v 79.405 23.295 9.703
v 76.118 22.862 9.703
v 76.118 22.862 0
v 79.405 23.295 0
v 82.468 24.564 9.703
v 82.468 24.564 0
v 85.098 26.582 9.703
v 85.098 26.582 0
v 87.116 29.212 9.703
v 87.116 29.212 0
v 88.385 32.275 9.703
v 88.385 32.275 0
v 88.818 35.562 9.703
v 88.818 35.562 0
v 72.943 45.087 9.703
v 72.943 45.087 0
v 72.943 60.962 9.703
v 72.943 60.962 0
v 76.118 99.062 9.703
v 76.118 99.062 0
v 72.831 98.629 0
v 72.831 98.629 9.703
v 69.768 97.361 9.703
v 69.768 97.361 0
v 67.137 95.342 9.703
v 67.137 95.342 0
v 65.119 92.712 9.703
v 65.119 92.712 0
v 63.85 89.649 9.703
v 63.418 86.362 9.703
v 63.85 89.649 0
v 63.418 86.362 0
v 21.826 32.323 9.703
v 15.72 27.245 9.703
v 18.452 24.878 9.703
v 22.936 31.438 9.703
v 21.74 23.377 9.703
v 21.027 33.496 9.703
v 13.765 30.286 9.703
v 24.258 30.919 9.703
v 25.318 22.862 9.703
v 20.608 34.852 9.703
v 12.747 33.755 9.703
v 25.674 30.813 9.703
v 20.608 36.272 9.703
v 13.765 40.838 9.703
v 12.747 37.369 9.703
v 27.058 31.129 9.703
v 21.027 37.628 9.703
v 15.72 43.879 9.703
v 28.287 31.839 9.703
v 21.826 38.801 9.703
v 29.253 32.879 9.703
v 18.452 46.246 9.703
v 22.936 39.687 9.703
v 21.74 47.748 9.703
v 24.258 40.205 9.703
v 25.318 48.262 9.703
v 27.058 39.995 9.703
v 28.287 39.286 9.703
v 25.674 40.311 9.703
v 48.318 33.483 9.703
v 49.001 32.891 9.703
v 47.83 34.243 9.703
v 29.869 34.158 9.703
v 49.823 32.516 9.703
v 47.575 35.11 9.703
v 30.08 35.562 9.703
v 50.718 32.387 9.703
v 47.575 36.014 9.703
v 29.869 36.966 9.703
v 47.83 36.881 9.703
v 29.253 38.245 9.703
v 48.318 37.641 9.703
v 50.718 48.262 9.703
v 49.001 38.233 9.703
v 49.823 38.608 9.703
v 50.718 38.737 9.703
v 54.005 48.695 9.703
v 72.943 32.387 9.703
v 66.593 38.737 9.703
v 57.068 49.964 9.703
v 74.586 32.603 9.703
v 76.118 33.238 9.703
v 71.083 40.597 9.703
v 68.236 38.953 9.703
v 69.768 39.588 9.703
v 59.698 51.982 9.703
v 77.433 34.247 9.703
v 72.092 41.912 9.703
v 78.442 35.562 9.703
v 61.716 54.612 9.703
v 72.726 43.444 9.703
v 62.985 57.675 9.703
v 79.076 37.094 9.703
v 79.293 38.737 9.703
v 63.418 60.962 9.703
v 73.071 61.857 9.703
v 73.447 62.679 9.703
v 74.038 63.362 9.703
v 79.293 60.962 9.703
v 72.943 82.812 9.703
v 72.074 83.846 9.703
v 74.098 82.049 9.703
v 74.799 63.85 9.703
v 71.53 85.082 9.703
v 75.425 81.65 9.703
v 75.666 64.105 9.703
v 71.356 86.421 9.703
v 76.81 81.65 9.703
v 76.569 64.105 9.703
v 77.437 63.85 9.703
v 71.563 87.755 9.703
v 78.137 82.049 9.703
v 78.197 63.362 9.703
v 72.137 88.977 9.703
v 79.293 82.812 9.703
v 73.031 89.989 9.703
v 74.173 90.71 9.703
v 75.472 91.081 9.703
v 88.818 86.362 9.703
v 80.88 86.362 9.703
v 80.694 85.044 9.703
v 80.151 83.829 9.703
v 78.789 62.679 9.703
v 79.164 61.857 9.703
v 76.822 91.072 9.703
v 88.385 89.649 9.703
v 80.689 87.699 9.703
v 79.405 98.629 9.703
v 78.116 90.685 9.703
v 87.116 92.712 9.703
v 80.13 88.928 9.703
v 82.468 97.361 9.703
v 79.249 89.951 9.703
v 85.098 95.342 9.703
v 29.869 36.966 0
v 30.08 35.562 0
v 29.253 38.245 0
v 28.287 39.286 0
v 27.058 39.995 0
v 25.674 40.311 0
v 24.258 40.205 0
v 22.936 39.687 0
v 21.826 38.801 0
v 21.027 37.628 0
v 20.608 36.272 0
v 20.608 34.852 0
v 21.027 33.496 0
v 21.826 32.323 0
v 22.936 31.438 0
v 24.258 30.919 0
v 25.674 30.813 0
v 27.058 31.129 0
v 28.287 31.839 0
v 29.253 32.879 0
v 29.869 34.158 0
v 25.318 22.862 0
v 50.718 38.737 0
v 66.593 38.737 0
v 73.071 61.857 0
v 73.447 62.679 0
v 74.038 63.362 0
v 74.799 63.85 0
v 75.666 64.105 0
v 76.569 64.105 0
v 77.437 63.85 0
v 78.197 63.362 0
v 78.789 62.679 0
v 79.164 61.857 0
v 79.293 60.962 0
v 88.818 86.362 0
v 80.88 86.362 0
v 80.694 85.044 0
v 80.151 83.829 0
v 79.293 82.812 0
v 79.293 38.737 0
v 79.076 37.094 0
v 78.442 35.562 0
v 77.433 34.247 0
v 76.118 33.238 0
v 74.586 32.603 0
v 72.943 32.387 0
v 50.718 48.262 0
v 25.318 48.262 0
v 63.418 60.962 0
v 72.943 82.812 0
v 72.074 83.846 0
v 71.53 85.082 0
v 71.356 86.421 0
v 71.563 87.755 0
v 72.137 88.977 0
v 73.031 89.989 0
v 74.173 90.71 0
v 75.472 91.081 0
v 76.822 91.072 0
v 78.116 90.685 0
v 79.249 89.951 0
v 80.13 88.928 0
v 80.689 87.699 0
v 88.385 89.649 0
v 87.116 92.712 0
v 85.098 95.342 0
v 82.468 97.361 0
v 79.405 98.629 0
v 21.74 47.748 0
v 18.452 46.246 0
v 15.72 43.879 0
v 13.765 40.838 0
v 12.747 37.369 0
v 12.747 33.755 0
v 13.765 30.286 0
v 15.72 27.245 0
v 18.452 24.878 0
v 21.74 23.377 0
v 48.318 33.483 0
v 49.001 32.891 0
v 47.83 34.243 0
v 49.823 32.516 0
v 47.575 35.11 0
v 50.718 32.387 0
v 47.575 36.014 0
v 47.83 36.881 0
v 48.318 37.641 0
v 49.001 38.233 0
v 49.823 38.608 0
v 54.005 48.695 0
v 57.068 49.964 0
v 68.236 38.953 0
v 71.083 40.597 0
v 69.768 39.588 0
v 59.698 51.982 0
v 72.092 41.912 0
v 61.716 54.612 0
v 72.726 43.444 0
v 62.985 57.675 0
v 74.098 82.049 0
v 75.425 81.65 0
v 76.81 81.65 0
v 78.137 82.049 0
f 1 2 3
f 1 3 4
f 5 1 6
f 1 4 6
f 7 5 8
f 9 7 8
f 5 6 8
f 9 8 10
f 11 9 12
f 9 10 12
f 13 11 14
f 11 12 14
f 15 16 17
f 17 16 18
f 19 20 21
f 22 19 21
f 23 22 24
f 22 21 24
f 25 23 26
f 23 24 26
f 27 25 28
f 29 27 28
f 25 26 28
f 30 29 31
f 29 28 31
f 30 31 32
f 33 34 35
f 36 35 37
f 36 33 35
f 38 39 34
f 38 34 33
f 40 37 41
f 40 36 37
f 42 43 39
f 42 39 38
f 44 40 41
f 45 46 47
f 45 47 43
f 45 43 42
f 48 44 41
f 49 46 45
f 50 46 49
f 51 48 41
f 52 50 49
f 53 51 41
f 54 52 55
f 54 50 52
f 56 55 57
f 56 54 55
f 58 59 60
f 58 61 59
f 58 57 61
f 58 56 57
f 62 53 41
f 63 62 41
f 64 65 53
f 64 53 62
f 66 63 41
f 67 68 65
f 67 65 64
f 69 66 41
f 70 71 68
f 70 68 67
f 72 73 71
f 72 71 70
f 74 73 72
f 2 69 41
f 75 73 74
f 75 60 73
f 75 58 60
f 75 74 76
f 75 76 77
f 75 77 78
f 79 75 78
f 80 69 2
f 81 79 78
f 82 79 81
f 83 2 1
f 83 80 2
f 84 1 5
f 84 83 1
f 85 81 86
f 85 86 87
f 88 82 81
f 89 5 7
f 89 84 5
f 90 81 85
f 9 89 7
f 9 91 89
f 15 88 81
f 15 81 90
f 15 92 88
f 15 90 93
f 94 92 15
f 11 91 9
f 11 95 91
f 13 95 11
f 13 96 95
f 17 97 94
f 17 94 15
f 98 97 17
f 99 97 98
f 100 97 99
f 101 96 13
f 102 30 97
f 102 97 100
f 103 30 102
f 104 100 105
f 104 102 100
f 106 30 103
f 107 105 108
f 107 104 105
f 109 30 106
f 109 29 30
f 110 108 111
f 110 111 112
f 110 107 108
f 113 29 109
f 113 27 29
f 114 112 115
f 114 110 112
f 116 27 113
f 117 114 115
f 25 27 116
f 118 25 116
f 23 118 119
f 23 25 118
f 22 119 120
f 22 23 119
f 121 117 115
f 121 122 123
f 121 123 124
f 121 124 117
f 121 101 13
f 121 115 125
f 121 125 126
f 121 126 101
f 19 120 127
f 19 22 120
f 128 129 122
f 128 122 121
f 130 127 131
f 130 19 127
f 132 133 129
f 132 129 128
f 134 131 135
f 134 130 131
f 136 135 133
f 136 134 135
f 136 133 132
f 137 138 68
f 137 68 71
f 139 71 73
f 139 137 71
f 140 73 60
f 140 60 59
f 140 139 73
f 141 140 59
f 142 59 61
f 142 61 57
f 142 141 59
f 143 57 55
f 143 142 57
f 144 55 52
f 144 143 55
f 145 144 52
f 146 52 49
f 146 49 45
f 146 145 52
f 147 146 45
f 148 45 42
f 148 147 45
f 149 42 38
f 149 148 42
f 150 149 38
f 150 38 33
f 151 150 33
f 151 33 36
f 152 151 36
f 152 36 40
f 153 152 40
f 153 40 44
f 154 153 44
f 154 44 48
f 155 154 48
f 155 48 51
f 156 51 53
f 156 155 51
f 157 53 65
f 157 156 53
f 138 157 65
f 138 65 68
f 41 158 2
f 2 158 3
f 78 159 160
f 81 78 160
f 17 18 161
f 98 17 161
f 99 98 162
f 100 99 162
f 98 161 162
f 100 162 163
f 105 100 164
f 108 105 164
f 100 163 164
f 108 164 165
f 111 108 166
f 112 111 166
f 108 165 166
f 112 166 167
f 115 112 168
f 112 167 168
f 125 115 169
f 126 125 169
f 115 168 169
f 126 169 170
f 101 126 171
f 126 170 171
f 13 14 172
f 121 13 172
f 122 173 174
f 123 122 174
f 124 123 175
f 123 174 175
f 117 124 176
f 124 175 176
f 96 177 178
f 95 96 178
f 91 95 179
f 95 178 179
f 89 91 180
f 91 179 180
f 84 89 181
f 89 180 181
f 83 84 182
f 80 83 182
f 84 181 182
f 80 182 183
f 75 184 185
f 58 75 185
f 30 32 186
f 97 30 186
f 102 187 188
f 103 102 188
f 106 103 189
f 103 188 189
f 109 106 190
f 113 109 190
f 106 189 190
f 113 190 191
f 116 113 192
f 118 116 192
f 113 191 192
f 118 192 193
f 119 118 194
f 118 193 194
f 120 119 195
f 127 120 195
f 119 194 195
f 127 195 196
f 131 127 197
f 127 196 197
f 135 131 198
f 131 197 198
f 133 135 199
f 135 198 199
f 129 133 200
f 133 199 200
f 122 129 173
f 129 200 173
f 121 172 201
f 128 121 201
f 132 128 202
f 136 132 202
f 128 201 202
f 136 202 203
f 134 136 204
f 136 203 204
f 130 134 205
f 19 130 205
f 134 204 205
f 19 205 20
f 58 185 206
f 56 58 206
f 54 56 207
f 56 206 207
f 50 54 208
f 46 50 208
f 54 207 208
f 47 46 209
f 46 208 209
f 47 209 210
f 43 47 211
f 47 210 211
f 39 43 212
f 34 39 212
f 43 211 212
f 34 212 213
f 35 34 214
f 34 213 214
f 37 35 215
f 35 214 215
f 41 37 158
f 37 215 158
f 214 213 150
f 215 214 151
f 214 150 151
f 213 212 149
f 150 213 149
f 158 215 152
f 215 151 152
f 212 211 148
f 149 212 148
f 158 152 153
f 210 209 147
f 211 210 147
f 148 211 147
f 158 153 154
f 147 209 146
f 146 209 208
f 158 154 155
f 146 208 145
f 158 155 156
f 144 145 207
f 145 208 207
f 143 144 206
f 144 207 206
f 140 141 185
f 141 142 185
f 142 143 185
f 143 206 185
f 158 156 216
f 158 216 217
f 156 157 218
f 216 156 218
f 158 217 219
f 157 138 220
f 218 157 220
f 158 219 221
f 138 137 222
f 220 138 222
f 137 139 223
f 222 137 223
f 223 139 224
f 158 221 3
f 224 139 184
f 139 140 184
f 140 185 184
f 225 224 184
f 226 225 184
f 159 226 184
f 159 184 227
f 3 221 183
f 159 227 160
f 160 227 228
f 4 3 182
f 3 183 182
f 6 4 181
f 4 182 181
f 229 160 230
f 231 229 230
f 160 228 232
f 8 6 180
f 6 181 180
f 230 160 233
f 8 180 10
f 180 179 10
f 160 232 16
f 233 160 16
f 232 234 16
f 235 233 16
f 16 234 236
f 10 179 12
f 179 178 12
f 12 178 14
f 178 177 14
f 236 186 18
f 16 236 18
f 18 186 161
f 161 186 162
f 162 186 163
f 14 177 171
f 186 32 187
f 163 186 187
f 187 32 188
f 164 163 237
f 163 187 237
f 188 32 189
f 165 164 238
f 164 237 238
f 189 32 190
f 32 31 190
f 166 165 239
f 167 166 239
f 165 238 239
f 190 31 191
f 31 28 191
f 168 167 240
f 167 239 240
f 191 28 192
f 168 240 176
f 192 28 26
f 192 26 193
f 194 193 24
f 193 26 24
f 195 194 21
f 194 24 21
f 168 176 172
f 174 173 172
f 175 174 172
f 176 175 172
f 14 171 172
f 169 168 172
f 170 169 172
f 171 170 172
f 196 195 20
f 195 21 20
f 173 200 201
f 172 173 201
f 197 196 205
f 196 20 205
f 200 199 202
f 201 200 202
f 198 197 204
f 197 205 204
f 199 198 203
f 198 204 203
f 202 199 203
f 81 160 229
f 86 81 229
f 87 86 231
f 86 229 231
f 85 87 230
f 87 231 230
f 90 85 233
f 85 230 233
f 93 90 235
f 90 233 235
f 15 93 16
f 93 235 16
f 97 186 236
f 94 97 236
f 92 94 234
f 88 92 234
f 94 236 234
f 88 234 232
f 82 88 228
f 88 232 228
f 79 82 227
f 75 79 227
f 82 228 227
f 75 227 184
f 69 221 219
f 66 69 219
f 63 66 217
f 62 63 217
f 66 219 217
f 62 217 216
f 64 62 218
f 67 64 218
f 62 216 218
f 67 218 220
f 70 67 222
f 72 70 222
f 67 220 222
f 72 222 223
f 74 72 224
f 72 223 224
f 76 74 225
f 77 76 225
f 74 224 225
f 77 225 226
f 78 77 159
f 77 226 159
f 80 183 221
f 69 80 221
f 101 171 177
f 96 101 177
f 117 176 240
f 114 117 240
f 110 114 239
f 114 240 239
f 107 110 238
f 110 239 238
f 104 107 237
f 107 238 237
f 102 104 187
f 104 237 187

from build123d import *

# Parameters (mm, degrees)
F0_R     = 4.7625
F1_DEPTH = 9.7028


with BuildPart() as f1:
    # F0 (on Top) → F1 (new body)
    with BuildSketch(Plane.XY):
        with BuildLine():
            ThreePointArc((25.317648, 48.26209), (12.617648, 35.56209), (25.317648, 22.86209))
            Line((25.317648, 22.86209), (76.117648, 22.86209))
            ThreePointArc((76.117648, 22.86209), (85.097904, 26.581834), (88.817648, 35.56209))
            Line((88.817648, 35.56209), (88.817648, 86.36209))
            ThreePointArc((88.817648, 86.36209), (85.097904, 95.342346), (76.117648, 99.06209))
            ThreePointArc((76.117648, 99.06209), (67.137391, 95.342346), (63.417648, 86.36209))
            Line((63.417648, 86.36209), (63.417648, 60.96209))
            ThreePointArc((63.417648, 60.96209), (59.697904, 51.981834), (50.717648, 48.26209))
            Line((50.717648, 48.26209), (25.317648, 48.26209))
        make_face()
        with Locations((25.317648, 35.56209)):
            Circle(F0_R, mode=Mode.SUBTRACT)
        with BuildLine():
            Line((79.292648, 60.96209), (79.292648, 38.73709))
            ThreePointArc((79.292648, 38.73709), (77.432776, 34.246962), (72.942648, 32.38709))
            Line((72.942648, 32.38709), (50.717648, 32.38709))
            ThreePointArc((50.717648, 32.38709), (47.542648, 35.56209), (50.717648, 38.73709))
            Line((50.717648, 38.73709), (66.592648, 38.73709))
            ThreePointArc((66.592648, 38.73709), (71.082776, 40.596962), (72.942648, 45.08709))
            Line((72.942648, 45.08709), (72.942648, 60.96209))
            ThreePointArc((72.942648, 60.96209), (76.117648, 64.13709), (79.292648, 60.96209))
        make_face(mode=Mode.SUBTRACT)
        with BuildLine():
            ThreePointArc((72.942648, 82.812332), (74.173365, 90.709638), (80.880148, 86.36209))
            ThreePointArc((80.880148, 86.36209), (80.465195, 84.417808), (79.292648, 82.812332))
            ThreePointArc((79.292648, 82.812332), (76.117648, 81.59959), (72.942648, 82.812332))
        make_face(mode=Mode.SUBTRACT)
    extrude(amount=F1_DEPTH)


solid = f1.part
